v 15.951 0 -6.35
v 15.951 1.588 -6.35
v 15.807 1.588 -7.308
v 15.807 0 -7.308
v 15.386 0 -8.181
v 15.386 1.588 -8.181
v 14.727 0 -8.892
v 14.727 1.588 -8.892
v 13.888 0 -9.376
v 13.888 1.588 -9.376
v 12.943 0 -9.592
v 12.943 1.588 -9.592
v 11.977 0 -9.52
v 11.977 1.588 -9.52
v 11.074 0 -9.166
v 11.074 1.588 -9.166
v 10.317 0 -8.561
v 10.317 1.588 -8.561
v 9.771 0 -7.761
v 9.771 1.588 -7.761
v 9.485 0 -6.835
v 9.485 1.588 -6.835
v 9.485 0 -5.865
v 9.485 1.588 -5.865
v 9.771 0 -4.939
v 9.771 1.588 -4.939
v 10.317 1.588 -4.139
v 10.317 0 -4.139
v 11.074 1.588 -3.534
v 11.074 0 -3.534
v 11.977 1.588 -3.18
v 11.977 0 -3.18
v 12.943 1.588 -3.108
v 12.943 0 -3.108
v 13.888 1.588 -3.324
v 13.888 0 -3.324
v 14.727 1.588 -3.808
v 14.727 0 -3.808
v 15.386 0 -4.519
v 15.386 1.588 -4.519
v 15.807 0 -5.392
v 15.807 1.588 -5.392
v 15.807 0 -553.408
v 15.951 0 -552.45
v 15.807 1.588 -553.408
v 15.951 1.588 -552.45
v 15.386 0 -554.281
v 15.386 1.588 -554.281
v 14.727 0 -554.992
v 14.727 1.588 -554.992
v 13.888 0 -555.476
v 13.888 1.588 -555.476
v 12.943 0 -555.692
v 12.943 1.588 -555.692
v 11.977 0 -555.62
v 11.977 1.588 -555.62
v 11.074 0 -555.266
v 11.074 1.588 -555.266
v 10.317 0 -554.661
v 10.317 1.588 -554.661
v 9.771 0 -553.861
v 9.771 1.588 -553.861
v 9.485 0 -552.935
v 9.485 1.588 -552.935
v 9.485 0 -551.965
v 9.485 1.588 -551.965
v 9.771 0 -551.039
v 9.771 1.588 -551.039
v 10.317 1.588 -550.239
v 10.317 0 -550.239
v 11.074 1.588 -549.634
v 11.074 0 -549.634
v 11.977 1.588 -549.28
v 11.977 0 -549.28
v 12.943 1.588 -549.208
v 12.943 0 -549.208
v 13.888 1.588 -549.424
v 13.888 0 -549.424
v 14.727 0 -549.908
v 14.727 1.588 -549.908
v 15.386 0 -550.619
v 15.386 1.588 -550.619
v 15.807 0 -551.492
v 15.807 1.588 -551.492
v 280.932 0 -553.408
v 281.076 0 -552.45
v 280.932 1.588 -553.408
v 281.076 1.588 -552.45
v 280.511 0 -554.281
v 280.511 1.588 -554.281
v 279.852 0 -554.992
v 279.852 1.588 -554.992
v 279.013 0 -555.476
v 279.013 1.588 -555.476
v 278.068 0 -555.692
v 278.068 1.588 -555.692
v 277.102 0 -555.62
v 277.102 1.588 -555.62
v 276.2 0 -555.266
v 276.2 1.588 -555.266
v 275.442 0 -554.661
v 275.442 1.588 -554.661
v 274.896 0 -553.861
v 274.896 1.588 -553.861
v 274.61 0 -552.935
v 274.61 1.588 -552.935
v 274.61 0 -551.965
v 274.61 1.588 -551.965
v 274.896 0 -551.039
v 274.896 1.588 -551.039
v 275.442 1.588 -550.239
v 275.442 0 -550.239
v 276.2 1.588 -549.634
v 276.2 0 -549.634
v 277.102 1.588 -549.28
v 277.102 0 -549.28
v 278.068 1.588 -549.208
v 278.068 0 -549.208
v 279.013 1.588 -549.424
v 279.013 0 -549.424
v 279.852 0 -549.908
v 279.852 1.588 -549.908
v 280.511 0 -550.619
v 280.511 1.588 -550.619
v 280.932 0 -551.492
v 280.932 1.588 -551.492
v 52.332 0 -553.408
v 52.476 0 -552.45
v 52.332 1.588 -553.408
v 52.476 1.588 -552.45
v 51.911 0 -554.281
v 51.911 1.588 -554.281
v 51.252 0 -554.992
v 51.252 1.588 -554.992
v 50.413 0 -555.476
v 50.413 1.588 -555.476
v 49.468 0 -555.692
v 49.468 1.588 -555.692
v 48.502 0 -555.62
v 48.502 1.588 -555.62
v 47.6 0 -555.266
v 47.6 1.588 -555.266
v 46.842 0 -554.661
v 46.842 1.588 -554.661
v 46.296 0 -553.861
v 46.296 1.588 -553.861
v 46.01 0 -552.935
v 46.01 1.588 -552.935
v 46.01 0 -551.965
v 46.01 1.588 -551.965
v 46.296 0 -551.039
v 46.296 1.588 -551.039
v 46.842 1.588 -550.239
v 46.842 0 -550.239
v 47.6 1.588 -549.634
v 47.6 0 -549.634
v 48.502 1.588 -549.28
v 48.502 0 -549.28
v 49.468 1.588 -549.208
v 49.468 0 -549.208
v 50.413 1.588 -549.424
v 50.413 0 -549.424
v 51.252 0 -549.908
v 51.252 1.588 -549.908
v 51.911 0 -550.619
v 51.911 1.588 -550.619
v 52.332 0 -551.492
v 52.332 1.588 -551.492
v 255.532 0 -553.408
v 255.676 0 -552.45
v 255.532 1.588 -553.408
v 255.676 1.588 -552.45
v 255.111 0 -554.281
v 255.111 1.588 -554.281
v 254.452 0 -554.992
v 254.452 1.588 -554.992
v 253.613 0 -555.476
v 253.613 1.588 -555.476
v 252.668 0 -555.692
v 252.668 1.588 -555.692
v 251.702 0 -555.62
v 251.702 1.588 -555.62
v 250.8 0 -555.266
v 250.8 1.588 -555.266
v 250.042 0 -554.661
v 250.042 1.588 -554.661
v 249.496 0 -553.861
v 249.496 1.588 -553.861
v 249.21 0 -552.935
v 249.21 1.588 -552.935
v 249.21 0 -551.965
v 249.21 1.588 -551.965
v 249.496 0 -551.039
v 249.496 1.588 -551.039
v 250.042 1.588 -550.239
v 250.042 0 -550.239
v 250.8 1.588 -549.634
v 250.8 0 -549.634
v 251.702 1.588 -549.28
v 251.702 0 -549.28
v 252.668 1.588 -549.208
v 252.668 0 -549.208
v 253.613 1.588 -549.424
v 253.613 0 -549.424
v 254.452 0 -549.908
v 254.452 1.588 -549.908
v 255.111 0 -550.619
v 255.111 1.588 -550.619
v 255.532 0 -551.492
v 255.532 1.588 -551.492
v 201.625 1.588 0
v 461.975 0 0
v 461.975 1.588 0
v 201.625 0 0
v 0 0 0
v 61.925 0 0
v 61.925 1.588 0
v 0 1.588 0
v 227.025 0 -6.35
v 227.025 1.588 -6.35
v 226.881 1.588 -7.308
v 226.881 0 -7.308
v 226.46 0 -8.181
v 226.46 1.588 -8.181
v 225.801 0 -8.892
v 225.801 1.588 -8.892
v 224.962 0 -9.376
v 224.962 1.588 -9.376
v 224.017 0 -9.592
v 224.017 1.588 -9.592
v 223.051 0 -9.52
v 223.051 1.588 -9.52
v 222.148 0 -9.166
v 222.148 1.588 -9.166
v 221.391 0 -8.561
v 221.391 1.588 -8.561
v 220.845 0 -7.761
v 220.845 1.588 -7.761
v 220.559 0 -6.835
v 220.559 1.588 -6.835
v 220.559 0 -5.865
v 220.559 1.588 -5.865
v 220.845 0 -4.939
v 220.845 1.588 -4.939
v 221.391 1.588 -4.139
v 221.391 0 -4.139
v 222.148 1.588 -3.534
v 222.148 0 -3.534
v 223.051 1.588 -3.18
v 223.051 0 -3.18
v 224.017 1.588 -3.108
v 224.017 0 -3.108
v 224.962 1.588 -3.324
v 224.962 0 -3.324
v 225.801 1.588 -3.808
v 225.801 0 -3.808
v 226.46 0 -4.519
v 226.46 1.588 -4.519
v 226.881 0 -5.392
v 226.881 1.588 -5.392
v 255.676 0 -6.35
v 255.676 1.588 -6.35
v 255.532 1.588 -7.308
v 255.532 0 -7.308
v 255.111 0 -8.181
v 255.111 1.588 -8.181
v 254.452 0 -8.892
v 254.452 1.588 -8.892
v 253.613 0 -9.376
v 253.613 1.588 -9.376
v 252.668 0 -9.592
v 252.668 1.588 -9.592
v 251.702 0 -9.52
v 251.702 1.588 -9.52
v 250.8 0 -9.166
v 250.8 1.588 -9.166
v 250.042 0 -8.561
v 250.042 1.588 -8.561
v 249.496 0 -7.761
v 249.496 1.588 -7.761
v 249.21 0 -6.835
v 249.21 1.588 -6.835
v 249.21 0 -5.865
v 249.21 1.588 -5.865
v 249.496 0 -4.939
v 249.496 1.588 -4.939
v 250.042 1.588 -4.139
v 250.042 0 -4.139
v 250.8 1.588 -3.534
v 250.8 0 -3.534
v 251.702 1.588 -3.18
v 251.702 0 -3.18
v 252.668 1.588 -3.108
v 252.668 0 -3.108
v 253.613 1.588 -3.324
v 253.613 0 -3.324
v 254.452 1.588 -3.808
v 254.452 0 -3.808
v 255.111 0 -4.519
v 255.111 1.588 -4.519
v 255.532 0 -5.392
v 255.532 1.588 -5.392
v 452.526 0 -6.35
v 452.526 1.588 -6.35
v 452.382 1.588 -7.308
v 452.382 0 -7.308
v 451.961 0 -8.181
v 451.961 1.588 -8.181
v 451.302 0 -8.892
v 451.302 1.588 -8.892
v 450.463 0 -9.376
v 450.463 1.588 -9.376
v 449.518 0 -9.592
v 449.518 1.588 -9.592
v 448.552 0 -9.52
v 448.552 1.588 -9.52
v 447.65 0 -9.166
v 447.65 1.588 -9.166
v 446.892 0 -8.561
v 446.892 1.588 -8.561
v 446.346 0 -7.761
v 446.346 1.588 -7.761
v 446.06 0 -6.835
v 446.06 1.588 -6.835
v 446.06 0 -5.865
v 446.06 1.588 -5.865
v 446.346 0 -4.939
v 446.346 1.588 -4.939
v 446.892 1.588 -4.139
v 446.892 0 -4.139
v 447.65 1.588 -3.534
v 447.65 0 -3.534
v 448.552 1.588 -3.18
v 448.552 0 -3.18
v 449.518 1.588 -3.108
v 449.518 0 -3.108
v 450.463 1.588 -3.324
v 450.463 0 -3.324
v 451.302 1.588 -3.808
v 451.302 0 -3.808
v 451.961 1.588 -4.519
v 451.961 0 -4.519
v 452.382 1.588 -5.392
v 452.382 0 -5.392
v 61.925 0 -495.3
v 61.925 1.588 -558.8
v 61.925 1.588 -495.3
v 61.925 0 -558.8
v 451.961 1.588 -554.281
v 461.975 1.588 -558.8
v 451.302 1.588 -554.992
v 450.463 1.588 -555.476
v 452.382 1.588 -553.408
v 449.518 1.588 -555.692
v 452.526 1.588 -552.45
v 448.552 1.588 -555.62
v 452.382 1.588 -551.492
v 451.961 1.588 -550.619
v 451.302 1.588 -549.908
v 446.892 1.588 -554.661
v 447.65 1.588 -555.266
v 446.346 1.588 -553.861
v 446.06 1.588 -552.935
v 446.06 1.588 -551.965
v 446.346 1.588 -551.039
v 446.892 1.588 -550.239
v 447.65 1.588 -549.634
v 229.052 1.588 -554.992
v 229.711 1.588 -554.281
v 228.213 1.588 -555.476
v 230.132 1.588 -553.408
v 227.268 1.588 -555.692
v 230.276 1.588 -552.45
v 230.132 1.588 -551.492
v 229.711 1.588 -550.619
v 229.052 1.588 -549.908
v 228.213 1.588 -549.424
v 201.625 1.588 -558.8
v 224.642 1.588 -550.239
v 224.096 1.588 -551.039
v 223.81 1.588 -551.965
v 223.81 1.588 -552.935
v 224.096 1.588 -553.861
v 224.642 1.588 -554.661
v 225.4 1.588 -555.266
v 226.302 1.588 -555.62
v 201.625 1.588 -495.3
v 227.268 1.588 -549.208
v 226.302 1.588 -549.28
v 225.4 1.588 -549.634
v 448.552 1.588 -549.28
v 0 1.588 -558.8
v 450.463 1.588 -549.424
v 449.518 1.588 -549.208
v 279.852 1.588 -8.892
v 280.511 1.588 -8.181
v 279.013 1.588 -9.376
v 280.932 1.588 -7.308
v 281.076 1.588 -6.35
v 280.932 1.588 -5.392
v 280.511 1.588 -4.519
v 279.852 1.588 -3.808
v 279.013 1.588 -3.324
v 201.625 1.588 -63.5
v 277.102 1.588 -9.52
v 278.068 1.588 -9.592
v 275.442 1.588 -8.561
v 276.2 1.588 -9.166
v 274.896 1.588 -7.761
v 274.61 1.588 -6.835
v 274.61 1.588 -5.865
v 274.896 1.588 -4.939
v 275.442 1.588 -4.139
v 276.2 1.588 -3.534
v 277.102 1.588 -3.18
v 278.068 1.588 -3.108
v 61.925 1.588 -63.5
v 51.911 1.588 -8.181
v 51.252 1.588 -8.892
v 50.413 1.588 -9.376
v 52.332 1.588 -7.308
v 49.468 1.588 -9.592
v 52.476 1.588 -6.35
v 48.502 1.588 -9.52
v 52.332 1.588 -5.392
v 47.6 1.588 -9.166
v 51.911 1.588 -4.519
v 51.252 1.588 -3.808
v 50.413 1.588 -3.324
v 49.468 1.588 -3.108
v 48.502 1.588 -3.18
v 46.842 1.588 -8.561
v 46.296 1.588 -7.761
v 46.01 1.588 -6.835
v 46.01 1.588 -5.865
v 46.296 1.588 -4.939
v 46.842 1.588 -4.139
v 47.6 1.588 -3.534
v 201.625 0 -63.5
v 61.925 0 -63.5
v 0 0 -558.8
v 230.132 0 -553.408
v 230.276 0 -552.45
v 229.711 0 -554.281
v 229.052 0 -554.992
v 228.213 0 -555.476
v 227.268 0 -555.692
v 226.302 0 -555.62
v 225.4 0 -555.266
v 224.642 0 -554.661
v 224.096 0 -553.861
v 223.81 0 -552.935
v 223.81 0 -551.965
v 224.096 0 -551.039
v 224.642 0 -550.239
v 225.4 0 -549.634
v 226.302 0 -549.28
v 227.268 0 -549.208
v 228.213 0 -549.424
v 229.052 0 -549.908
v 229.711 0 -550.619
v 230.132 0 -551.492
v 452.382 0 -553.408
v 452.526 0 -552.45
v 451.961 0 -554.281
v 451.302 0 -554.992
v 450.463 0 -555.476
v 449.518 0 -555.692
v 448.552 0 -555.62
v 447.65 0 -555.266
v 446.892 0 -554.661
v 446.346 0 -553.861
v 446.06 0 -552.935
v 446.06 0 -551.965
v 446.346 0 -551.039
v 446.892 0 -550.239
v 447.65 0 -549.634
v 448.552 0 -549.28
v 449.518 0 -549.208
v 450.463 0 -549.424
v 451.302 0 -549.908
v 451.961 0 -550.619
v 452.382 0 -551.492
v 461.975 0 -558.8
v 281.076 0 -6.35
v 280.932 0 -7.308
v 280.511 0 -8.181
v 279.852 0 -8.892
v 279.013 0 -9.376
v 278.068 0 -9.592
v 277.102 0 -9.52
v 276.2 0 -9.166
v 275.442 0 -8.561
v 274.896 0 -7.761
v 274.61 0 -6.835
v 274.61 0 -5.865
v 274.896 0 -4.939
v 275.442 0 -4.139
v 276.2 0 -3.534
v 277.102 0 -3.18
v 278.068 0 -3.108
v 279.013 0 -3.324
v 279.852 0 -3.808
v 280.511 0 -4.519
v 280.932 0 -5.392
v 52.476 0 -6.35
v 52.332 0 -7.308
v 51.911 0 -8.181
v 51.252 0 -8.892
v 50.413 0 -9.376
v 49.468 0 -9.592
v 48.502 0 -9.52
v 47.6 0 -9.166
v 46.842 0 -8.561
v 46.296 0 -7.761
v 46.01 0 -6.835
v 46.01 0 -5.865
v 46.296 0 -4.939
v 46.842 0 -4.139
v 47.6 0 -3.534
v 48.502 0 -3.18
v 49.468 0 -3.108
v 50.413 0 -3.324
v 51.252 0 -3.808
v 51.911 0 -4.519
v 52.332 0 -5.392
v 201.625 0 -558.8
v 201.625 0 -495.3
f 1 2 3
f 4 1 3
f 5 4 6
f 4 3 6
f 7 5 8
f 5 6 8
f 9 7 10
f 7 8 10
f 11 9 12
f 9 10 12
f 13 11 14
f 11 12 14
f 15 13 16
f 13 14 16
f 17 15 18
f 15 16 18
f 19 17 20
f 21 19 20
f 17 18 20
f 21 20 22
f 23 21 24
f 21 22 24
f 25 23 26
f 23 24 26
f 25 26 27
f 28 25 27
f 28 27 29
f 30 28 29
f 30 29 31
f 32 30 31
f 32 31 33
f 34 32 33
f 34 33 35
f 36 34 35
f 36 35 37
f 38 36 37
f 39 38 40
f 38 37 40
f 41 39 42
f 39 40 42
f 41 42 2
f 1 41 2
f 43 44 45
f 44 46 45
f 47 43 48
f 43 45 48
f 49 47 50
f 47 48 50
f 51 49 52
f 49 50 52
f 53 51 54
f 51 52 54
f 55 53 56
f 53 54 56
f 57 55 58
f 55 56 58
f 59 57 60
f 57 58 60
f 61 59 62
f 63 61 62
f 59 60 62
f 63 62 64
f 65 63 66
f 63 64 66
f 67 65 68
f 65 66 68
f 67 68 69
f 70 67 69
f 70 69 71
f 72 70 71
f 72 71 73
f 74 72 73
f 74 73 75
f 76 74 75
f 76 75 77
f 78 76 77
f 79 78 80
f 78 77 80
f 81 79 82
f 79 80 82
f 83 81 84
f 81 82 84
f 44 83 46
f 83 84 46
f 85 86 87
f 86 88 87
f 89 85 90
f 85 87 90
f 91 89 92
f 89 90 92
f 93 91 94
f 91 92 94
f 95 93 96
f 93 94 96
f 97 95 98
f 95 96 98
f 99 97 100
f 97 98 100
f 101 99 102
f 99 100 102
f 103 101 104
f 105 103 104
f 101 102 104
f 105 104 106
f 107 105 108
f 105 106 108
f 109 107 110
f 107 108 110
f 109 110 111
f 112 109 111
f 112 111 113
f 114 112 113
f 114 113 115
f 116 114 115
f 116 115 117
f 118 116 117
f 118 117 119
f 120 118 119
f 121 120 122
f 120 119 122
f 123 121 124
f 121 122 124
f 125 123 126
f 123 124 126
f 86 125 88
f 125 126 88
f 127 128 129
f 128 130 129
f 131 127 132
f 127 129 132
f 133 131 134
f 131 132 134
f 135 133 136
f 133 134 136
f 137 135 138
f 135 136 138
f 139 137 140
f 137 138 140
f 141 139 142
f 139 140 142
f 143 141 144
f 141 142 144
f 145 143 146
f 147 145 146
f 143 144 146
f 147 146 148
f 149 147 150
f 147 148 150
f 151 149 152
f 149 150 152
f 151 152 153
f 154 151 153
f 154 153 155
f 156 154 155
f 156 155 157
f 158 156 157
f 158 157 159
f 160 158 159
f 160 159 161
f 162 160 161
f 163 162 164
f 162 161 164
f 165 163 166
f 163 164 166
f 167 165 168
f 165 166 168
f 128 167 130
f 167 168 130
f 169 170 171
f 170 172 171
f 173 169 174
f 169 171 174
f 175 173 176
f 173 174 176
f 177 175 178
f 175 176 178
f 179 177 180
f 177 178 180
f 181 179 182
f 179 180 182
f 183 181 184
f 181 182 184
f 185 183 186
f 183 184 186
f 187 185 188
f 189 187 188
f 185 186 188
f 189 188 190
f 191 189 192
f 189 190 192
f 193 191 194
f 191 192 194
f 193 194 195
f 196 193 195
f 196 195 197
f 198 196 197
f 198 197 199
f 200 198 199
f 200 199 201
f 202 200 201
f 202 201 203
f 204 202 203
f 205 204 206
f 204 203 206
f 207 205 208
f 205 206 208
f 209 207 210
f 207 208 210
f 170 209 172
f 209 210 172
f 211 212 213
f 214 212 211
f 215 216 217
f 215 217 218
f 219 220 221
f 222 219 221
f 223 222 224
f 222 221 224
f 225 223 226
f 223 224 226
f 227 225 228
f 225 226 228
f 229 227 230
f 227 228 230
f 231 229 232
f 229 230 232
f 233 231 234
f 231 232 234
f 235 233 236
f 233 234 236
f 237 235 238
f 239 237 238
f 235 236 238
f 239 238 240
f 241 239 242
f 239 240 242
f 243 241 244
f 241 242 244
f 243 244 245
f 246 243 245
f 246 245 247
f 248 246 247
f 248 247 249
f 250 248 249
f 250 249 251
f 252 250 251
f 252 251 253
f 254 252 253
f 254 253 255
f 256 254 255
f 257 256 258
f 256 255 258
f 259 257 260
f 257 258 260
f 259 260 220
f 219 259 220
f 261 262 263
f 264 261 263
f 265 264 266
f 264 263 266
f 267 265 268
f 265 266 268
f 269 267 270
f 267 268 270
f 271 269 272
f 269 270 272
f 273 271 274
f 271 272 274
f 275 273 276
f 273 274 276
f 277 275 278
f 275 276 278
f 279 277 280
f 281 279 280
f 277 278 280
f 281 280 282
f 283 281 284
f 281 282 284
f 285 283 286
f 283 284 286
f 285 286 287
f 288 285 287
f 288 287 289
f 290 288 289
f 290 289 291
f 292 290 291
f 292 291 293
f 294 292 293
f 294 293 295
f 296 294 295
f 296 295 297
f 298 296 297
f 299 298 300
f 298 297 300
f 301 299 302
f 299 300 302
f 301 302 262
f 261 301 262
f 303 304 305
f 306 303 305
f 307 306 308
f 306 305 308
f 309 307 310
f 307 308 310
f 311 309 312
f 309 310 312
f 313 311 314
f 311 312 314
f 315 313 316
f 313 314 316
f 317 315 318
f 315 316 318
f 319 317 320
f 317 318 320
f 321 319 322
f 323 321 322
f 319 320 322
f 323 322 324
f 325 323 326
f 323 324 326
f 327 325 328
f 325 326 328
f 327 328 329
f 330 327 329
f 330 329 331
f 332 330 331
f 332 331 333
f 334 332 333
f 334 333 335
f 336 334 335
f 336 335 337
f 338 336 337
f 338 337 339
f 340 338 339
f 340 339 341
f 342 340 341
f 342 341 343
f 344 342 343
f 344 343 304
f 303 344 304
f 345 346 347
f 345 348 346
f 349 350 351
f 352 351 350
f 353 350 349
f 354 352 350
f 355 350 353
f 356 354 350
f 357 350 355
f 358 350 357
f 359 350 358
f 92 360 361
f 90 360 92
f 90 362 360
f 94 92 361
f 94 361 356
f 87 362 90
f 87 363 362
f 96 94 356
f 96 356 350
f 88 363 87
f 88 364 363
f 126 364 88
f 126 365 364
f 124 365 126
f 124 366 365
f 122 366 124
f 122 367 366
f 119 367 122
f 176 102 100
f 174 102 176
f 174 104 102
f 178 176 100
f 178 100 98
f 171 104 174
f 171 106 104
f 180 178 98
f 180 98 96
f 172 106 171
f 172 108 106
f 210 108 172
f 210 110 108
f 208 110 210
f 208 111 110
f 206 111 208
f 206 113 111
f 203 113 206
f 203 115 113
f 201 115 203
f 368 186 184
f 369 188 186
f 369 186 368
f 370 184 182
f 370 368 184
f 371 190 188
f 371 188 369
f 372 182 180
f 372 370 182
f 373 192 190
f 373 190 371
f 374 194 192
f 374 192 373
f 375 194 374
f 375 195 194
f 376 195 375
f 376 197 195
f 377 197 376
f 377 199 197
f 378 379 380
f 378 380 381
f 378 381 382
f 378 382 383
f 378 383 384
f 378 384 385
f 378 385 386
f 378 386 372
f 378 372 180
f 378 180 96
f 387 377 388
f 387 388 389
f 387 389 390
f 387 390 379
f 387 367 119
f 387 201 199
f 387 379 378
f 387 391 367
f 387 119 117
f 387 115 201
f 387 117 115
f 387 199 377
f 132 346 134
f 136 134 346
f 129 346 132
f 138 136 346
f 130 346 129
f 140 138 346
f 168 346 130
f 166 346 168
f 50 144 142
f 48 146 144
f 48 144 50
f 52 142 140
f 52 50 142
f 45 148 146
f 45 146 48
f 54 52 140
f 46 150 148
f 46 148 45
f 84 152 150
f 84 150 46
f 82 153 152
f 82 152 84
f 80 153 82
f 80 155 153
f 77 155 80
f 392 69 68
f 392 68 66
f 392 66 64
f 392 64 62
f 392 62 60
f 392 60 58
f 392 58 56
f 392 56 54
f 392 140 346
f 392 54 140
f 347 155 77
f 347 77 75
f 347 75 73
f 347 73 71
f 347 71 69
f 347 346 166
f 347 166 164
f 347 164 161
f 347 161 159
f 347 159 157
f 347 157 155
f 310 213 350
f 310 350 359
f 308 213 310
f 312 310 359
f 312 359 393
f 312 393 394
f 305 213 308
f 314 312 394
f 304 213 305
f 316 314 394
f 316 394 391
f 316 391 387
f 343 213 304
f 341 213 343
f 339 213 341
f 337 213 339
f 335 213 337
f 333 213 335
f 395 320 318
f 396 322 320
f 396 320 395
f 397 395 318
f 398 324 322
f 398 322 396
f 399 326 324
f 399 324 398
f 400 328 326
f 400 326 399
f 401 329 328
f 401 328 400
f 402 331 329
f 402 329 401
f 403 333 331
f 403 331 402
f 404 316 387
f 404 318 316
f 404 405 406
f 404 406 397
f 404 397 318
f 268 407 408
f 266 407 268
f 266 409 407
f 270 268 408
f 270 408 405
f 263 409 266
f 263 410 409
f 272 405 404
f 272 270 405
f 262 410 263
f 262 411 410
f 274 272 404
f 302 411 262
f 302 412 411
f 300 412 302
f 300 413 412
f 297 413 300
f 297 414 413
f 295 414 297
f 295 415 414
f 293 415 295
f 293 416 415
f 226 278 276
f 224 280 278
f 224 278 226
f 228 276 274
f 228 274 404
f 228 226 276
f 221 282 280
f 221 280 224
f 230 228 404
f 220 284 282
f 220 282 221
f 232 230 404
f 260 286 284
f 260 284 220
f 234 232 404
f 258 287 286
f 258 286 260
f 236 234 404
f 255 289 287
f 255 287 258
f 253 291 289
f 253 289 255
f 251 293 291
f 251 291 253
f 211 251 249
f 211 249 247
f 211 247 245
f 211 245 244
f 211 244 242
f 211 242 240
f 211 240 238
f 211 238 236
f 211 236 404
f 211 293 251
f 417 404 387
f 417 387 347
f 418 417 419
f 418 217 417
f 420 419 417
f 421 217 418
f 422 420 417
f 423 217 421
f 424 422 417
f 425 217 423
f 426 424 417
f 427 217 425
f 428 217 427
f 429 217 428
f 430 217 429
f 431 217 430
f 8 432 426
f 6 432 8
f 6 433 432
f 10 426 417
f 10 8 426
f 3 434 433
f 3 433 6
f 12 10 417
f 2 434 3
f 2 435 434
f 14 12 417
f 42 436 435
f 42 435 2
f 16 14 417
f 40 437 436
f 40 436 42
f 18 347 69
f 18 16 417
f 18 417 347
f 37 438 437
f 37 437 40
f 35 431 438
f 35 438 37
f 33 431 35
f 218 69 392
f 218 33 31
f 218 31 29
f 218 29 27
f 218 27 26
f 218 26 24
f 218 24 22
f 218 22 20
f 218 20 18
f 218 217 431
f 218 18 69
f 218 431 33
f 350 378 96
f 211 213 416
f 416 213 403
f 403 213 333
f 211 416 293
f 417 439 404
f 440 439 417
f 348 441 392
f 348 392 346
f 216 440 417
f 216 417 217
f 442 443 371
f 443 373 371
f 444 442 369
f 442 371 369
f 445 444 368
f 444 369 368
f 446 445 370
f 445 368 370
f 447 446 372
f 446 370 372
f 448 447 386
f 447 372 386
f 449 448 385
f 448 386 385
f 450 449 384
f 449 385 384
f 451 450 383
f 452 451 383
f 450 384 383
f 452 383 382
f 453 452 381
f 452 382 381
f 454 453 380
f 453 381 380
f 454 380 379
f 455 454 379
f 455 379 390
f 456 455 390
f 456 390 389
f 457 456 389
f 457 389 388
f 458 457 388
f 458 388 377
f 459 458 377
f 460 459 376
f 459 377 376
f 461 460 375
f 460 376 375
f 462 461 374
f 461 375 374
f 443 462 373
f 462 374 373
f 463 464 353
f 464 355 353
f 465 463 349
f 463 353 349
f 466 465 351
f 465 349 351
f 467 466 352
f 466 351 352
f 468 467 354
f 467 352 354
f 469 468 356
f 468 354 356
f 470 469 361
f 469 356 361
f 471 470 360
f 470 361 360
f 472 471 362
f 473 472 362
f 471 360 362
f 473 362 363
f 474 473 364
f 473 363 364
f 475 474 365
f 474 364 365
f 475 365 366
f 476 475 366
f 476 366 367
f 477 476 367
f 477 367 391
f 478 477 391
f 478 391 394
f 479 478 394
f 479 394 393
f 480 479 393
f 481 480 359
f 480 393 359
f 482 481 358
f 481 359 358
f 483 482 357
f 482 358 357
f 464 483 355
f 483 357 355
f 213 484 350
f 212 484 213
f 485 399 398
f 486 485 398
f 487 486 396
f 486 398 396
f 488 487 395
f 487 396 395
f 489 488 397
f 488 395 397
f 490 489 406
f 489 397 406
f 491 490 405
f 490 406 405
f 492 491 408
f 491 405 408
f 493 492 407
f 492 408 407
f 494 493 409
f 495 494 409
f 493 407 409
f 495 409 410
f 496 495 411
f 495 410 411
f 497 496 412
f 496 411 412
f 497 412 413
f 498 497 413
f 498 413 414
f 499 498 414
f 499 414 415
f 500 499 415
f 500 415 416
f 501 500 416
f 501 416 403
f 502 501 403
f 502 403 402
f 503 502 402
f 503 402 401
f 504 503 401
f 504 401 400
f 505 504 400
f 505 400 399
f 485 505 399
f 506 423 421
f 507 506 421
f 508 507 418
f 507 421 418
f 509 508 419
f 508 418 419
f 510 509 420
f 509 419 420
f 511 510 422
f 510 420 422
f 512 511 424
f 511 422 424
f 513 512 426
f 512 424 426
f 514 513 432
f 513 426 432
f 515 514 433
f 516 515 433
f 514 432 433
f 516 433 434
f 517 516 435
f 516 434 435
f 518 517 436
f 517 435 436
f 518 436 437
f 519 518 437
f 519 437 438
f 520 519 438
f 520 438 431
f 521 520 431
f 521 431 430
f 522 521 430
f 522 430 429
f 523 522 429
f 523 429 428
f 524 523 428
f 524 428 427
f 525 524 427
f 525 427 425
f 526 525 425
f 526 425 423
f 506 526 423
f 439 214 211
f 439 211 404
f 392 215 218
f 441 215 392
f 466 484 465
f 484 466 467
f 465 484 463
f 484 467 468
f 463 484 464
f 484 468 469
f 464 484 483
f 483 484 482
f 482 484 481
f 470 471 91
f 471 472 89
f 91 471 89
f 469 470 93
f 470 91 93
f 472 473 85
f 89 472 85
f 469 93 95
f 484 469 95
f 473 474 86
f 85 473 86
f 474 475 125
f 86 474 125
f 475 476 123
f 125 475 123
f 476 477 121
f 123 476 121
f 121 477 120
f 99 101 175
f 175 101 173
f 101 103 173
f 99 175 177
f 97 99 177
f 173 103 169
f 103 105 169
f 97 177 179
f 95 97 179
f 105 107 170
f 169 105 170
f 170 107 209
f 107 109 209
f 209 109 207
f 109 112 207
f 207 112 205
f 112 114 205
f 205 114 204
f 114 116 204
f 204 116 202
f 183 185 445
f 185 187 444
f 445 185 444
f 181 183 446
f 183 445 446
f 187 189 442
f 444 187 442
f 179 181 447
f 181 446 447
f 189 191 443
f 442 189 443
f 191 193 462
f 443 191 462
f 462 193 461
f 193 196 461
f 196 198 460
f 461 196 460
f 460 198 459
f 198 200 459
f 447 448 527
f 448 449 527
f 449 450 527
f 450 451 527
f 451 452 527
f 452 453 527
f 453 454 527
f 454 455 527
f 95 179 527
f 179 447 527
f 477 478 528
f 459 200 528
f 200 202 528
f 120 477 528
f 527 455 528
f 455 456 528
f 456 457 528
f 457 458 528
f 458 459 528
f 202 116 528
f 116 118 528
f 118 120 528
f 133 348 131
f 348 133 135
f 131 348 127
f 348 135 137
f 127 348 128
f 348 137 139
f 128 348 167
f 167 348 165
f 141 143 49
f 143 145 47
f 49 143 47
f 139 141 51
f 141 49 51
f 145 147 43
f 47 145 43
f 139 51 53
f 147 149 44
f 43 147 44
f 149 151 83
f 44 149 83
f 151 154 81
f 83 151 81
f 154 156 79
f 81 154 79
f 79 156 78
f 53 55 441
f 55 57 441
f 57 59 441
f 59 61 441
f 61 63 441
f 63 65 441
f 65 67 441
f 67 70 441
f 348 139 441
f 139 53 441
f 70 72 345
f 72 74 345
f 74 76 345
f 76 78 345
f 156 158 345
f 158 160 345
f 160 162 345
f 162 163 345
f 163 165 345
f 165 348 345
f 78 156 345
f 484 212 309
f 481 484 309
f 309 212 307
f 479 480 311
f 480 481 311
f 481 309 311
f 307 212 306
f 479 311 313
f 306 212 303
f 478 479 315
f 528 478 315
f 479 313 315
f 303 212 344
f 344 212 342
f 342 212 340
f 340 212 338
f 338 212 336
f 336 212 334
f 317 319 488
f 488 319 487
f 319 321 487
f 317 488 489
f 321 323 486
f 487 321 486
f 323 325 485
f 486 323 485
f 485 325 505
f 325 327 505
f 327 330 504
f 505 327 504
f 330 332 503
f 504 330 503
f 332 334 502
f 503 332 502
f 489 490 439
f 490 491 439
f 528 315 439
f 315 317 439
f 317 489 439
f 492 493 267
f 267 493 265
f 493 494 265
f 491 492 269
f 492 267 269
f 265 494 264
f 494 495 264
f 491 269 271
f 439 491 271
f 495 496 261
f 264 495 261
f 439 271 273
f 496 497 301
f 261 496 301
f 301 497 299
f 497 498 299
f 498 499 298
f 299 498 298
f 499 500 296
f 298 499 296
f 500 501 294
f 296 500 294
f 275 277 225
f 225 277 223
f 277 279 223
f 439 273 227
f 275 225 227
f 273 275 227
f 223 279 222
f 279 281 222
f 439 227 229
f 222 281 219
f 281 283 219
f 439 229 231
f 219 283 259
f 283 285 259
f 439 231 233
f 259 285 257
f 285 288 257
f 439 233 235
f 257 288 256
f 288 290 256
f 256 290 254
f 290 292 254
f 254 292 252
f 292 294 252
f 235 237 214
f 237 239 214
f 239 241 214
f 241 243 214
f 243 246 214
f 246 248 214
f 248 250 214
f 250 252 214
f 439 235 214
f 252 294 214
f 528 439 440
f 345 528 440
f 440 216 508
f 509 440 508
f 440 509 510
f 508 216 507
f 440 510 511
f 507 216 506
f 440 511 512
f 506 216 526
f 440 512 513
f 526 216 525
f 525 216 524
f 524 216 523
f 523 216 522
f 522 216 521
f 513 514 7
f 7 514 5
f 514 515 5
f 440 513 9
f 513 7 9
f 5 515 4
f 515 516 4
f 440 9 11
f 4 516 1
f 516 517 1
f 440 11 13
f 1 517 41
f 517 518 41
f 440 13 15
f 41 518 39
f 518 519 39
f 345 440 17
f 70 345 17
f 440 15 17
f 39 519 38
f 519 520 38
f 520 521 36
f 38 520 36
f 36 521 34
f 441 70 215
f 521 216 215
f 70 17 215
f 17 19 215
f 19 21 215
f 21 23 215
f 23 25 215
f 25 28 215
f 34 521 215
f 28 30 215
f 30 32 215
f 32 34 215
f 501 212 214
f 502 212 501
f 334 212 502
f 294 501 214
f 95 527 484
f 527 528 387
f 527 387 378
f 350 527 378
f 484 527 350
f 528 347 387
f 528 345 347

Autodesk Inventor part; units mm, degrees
ref_plane "YZ Plane" through (0, 0, 0) normal (1, 0, 0) x (0, 1, 0)
ref_plane "XZ Plane" through (0, 0, 0) normal (0, 1, 0) x (-1, 0, 0)
ref_plane "XY Plane" through (0, 0, 0) normal (0, 0, 1) x (1, 0, 0)
sketch "Sketch1" plane through (0, 0, 0) normal (0, 1, 0) x (-1, 0, 0)
  point P0 (0, 0)
sketch "Sketch2" plane through (0, 0, 0) normal (0, 1, 0) x (-1, 0, 0)
  line L0 (-61.9252, 0) -> (0, 0)
  line L1 (0, 0) -> (0, -558.8)
  line L2 (0, -558.8) -> (-61.9252, -558.8)
  line L3 (-61.9252, -558.8) -> (-61.9252, -495.3)
  line L4 (-61.9252, -495.3) -> (-201.6252, -495.3)
  line L5 (-201.6252, -495.3) -> (-201.6252, -558.8)
  line L6 (-201.6252, -558.8) -> (-461.9752, -558.8)
  line L7 (-461.9752, -558.8) -> (-461.9752, 0)
  line L8 (-461.9752, 0) -> (-201.6252, 0)
  line L9 (-201.6252, 0) -> (-201.6252, -63.5)
  line L10 (-201.6252, -63.5) -> (-61.9252, -63.5)
  line L11 (-61.9252, -63.5) -> (-61.9252, 0)
  point P0 (0, 0)
  dimension "d1" = 558.8
  dimension "d2" = 139.7
  dimension "d3" = 61.9252
  dimension "d4" = 63.5
  dimension "d8" = 260.35
extrude "Extrusion1" add sketch "Sketch2" along normal blind 1.5875
sketch "Sketch3" plane through (0, 1.5875, 0) normal (0, 1, 0) x (1, 0, 0)
  line L0 (461.9752, 0) -> (461.9752, 558.8) projected
  line L1 (461.9752, 0) -> (461.9752, 12.7)
  line L2 (461.9752, 12.7) -> (201.6252, 12.7)
  line L3 (201.6252, 63.5) -> (201.6252, 0) projected
  line L4 (201.6252, 558.8) -> (461.9752, 558.8) projected
  line L5 (461.9752, 558.8) -> (461.9752, 546.1)
  line L6 (461.9752, 546.1) -> (201.6252, 546.1)
  line L7 (201.6252, 558.8) -> (201.6252, 495.3) projected
  line L8 (461.9752, 6.35) -> (201.6252, 6.35)
  line L9 (461.9752, 552.45) -> (201.6252, 552.45)
  line L10 (461.9752, 552.45) -> (449.2752, 552.45)
  line L11 (461.9752, 6.35) -> (449.2752, 6.35)
  line L12 (201.6252, 552.45) -> (227.0252, 552.45)
  line L13 (227.0252, 552.45) -> (252.4252, 552.45)
  line L14 (252.4252, 552.45) -> (277.8252, 552.45)
  line L15 (201.6252, 6.35) -> (227.0252, 6.35)
  line L16 (227.0252, 6.35) -> (252.4252, 6.35)
  line L17 (252.4252, 6.35) -> (277.8252, 6.35)
  line L18 (0, 558.8) -> (0, 0) projected
  line L19 (0, 552.45) -> (62.0515, 552.45)
  line L20 (0, 6.35) -> (62.0515, 6.35)
  line L21 (0, 552.45) -> (12.7, 552.45)
  line L22 (61.9252, 495.3) -> (61.9252, 558.8) projected
  line L23 (61.9252, 552.45) -> (49.2252, 552.45)
  circle A0 centre (49.2252, 552.45) radius 3.2512
  circle A1 centre (12.7, 552.45) radius 3.2512
  circle A2 centre (227.0252, 552.45) radius 3.2512
  circle A3 centre (252.4252, 552.45) radius 3.2512
  circle A4 centre (277.8252, 552.45) radius 3.2512
  circle A5 centre (449.2752, 552.45) radius 3.2512
  line L24 (461.9752, 6.35) -> (449.2752, 6.35)
  circle A6 centre (449.2752, 6.35) radius 3.2512
  line L25 (201.6252, 6.35) -> (227.0252, 6.35)
  circle A7 centre (223.774, 6.35) radius 3.2512
  circle A8 centre (252.4252, 6.35) radius 3.2512
  circle A9 centre (277.8252, 6.35) radius 3.2512
  circle A10 centre (49.2252, 6.35) radius 3.2512
  circle A11 centre (12.7, 6.35) radius 3.2512
  line L26 (449.2752, 558.8) -> (449.2752, 0)
  line L27 (449.2752, 558.8) -> (455.6252, 558.8)
  line L28 (455.6252, 558.8) -> (455.6252, 0)
  line L29 (461.9752, 0) -> (201.6252, 0) projected
  line L30 (455.6252, 546.1) -> (455.6252, 368.3)
  line L31 (455.6252, 368.3) -> (455.6252, 190.5)
  circle A12 centre (455.6252, 368.3) radius 3.2512
  circle A13 centre (455.6252, 190.5) radius 3.2512
  dimension "d9" = 12.7
  dimension "d10" = 12.7
  dimension "d11" = 12.7
  dimension "d12" = 25.4
  dimension "d13" = 25.4
  dimension "d14" = 25.4
  dimension "d15" = 12.7
  dimension "d16" = 12.7
  dimension "d17" = 6.5024
  dimension "d18" = 12.7
  dimension "d19" = 177.8
  dimension "d20" = 177.8
  dimension "d21" = 6.5024
extrude "Extrusion2" cut sketch "Sketch3" against normal blind 25.4 contours A6 L26 L8 | L8 L26 A6 | A6 L8 L26 | L8 A6 L26 | A9 L8 | L8 A9 | A7 L8 | L8 A7 | A5 L26 L9 | L9 L26 A5 | A5 L9 L26 | L9 A5 L26 | A8 L8 | L8 A8 | A2 L9 | L9 A2 | A4 L9 | L9 A4 | A3 L9 | L9 A3 | A10 L20 | L20 A10 | A11 L20 | L20 A11 | A0 L19 | L19 A0 | A1 L19 | L19 A1
properties part number "Belly Pan" material "Aluminum 6061"
